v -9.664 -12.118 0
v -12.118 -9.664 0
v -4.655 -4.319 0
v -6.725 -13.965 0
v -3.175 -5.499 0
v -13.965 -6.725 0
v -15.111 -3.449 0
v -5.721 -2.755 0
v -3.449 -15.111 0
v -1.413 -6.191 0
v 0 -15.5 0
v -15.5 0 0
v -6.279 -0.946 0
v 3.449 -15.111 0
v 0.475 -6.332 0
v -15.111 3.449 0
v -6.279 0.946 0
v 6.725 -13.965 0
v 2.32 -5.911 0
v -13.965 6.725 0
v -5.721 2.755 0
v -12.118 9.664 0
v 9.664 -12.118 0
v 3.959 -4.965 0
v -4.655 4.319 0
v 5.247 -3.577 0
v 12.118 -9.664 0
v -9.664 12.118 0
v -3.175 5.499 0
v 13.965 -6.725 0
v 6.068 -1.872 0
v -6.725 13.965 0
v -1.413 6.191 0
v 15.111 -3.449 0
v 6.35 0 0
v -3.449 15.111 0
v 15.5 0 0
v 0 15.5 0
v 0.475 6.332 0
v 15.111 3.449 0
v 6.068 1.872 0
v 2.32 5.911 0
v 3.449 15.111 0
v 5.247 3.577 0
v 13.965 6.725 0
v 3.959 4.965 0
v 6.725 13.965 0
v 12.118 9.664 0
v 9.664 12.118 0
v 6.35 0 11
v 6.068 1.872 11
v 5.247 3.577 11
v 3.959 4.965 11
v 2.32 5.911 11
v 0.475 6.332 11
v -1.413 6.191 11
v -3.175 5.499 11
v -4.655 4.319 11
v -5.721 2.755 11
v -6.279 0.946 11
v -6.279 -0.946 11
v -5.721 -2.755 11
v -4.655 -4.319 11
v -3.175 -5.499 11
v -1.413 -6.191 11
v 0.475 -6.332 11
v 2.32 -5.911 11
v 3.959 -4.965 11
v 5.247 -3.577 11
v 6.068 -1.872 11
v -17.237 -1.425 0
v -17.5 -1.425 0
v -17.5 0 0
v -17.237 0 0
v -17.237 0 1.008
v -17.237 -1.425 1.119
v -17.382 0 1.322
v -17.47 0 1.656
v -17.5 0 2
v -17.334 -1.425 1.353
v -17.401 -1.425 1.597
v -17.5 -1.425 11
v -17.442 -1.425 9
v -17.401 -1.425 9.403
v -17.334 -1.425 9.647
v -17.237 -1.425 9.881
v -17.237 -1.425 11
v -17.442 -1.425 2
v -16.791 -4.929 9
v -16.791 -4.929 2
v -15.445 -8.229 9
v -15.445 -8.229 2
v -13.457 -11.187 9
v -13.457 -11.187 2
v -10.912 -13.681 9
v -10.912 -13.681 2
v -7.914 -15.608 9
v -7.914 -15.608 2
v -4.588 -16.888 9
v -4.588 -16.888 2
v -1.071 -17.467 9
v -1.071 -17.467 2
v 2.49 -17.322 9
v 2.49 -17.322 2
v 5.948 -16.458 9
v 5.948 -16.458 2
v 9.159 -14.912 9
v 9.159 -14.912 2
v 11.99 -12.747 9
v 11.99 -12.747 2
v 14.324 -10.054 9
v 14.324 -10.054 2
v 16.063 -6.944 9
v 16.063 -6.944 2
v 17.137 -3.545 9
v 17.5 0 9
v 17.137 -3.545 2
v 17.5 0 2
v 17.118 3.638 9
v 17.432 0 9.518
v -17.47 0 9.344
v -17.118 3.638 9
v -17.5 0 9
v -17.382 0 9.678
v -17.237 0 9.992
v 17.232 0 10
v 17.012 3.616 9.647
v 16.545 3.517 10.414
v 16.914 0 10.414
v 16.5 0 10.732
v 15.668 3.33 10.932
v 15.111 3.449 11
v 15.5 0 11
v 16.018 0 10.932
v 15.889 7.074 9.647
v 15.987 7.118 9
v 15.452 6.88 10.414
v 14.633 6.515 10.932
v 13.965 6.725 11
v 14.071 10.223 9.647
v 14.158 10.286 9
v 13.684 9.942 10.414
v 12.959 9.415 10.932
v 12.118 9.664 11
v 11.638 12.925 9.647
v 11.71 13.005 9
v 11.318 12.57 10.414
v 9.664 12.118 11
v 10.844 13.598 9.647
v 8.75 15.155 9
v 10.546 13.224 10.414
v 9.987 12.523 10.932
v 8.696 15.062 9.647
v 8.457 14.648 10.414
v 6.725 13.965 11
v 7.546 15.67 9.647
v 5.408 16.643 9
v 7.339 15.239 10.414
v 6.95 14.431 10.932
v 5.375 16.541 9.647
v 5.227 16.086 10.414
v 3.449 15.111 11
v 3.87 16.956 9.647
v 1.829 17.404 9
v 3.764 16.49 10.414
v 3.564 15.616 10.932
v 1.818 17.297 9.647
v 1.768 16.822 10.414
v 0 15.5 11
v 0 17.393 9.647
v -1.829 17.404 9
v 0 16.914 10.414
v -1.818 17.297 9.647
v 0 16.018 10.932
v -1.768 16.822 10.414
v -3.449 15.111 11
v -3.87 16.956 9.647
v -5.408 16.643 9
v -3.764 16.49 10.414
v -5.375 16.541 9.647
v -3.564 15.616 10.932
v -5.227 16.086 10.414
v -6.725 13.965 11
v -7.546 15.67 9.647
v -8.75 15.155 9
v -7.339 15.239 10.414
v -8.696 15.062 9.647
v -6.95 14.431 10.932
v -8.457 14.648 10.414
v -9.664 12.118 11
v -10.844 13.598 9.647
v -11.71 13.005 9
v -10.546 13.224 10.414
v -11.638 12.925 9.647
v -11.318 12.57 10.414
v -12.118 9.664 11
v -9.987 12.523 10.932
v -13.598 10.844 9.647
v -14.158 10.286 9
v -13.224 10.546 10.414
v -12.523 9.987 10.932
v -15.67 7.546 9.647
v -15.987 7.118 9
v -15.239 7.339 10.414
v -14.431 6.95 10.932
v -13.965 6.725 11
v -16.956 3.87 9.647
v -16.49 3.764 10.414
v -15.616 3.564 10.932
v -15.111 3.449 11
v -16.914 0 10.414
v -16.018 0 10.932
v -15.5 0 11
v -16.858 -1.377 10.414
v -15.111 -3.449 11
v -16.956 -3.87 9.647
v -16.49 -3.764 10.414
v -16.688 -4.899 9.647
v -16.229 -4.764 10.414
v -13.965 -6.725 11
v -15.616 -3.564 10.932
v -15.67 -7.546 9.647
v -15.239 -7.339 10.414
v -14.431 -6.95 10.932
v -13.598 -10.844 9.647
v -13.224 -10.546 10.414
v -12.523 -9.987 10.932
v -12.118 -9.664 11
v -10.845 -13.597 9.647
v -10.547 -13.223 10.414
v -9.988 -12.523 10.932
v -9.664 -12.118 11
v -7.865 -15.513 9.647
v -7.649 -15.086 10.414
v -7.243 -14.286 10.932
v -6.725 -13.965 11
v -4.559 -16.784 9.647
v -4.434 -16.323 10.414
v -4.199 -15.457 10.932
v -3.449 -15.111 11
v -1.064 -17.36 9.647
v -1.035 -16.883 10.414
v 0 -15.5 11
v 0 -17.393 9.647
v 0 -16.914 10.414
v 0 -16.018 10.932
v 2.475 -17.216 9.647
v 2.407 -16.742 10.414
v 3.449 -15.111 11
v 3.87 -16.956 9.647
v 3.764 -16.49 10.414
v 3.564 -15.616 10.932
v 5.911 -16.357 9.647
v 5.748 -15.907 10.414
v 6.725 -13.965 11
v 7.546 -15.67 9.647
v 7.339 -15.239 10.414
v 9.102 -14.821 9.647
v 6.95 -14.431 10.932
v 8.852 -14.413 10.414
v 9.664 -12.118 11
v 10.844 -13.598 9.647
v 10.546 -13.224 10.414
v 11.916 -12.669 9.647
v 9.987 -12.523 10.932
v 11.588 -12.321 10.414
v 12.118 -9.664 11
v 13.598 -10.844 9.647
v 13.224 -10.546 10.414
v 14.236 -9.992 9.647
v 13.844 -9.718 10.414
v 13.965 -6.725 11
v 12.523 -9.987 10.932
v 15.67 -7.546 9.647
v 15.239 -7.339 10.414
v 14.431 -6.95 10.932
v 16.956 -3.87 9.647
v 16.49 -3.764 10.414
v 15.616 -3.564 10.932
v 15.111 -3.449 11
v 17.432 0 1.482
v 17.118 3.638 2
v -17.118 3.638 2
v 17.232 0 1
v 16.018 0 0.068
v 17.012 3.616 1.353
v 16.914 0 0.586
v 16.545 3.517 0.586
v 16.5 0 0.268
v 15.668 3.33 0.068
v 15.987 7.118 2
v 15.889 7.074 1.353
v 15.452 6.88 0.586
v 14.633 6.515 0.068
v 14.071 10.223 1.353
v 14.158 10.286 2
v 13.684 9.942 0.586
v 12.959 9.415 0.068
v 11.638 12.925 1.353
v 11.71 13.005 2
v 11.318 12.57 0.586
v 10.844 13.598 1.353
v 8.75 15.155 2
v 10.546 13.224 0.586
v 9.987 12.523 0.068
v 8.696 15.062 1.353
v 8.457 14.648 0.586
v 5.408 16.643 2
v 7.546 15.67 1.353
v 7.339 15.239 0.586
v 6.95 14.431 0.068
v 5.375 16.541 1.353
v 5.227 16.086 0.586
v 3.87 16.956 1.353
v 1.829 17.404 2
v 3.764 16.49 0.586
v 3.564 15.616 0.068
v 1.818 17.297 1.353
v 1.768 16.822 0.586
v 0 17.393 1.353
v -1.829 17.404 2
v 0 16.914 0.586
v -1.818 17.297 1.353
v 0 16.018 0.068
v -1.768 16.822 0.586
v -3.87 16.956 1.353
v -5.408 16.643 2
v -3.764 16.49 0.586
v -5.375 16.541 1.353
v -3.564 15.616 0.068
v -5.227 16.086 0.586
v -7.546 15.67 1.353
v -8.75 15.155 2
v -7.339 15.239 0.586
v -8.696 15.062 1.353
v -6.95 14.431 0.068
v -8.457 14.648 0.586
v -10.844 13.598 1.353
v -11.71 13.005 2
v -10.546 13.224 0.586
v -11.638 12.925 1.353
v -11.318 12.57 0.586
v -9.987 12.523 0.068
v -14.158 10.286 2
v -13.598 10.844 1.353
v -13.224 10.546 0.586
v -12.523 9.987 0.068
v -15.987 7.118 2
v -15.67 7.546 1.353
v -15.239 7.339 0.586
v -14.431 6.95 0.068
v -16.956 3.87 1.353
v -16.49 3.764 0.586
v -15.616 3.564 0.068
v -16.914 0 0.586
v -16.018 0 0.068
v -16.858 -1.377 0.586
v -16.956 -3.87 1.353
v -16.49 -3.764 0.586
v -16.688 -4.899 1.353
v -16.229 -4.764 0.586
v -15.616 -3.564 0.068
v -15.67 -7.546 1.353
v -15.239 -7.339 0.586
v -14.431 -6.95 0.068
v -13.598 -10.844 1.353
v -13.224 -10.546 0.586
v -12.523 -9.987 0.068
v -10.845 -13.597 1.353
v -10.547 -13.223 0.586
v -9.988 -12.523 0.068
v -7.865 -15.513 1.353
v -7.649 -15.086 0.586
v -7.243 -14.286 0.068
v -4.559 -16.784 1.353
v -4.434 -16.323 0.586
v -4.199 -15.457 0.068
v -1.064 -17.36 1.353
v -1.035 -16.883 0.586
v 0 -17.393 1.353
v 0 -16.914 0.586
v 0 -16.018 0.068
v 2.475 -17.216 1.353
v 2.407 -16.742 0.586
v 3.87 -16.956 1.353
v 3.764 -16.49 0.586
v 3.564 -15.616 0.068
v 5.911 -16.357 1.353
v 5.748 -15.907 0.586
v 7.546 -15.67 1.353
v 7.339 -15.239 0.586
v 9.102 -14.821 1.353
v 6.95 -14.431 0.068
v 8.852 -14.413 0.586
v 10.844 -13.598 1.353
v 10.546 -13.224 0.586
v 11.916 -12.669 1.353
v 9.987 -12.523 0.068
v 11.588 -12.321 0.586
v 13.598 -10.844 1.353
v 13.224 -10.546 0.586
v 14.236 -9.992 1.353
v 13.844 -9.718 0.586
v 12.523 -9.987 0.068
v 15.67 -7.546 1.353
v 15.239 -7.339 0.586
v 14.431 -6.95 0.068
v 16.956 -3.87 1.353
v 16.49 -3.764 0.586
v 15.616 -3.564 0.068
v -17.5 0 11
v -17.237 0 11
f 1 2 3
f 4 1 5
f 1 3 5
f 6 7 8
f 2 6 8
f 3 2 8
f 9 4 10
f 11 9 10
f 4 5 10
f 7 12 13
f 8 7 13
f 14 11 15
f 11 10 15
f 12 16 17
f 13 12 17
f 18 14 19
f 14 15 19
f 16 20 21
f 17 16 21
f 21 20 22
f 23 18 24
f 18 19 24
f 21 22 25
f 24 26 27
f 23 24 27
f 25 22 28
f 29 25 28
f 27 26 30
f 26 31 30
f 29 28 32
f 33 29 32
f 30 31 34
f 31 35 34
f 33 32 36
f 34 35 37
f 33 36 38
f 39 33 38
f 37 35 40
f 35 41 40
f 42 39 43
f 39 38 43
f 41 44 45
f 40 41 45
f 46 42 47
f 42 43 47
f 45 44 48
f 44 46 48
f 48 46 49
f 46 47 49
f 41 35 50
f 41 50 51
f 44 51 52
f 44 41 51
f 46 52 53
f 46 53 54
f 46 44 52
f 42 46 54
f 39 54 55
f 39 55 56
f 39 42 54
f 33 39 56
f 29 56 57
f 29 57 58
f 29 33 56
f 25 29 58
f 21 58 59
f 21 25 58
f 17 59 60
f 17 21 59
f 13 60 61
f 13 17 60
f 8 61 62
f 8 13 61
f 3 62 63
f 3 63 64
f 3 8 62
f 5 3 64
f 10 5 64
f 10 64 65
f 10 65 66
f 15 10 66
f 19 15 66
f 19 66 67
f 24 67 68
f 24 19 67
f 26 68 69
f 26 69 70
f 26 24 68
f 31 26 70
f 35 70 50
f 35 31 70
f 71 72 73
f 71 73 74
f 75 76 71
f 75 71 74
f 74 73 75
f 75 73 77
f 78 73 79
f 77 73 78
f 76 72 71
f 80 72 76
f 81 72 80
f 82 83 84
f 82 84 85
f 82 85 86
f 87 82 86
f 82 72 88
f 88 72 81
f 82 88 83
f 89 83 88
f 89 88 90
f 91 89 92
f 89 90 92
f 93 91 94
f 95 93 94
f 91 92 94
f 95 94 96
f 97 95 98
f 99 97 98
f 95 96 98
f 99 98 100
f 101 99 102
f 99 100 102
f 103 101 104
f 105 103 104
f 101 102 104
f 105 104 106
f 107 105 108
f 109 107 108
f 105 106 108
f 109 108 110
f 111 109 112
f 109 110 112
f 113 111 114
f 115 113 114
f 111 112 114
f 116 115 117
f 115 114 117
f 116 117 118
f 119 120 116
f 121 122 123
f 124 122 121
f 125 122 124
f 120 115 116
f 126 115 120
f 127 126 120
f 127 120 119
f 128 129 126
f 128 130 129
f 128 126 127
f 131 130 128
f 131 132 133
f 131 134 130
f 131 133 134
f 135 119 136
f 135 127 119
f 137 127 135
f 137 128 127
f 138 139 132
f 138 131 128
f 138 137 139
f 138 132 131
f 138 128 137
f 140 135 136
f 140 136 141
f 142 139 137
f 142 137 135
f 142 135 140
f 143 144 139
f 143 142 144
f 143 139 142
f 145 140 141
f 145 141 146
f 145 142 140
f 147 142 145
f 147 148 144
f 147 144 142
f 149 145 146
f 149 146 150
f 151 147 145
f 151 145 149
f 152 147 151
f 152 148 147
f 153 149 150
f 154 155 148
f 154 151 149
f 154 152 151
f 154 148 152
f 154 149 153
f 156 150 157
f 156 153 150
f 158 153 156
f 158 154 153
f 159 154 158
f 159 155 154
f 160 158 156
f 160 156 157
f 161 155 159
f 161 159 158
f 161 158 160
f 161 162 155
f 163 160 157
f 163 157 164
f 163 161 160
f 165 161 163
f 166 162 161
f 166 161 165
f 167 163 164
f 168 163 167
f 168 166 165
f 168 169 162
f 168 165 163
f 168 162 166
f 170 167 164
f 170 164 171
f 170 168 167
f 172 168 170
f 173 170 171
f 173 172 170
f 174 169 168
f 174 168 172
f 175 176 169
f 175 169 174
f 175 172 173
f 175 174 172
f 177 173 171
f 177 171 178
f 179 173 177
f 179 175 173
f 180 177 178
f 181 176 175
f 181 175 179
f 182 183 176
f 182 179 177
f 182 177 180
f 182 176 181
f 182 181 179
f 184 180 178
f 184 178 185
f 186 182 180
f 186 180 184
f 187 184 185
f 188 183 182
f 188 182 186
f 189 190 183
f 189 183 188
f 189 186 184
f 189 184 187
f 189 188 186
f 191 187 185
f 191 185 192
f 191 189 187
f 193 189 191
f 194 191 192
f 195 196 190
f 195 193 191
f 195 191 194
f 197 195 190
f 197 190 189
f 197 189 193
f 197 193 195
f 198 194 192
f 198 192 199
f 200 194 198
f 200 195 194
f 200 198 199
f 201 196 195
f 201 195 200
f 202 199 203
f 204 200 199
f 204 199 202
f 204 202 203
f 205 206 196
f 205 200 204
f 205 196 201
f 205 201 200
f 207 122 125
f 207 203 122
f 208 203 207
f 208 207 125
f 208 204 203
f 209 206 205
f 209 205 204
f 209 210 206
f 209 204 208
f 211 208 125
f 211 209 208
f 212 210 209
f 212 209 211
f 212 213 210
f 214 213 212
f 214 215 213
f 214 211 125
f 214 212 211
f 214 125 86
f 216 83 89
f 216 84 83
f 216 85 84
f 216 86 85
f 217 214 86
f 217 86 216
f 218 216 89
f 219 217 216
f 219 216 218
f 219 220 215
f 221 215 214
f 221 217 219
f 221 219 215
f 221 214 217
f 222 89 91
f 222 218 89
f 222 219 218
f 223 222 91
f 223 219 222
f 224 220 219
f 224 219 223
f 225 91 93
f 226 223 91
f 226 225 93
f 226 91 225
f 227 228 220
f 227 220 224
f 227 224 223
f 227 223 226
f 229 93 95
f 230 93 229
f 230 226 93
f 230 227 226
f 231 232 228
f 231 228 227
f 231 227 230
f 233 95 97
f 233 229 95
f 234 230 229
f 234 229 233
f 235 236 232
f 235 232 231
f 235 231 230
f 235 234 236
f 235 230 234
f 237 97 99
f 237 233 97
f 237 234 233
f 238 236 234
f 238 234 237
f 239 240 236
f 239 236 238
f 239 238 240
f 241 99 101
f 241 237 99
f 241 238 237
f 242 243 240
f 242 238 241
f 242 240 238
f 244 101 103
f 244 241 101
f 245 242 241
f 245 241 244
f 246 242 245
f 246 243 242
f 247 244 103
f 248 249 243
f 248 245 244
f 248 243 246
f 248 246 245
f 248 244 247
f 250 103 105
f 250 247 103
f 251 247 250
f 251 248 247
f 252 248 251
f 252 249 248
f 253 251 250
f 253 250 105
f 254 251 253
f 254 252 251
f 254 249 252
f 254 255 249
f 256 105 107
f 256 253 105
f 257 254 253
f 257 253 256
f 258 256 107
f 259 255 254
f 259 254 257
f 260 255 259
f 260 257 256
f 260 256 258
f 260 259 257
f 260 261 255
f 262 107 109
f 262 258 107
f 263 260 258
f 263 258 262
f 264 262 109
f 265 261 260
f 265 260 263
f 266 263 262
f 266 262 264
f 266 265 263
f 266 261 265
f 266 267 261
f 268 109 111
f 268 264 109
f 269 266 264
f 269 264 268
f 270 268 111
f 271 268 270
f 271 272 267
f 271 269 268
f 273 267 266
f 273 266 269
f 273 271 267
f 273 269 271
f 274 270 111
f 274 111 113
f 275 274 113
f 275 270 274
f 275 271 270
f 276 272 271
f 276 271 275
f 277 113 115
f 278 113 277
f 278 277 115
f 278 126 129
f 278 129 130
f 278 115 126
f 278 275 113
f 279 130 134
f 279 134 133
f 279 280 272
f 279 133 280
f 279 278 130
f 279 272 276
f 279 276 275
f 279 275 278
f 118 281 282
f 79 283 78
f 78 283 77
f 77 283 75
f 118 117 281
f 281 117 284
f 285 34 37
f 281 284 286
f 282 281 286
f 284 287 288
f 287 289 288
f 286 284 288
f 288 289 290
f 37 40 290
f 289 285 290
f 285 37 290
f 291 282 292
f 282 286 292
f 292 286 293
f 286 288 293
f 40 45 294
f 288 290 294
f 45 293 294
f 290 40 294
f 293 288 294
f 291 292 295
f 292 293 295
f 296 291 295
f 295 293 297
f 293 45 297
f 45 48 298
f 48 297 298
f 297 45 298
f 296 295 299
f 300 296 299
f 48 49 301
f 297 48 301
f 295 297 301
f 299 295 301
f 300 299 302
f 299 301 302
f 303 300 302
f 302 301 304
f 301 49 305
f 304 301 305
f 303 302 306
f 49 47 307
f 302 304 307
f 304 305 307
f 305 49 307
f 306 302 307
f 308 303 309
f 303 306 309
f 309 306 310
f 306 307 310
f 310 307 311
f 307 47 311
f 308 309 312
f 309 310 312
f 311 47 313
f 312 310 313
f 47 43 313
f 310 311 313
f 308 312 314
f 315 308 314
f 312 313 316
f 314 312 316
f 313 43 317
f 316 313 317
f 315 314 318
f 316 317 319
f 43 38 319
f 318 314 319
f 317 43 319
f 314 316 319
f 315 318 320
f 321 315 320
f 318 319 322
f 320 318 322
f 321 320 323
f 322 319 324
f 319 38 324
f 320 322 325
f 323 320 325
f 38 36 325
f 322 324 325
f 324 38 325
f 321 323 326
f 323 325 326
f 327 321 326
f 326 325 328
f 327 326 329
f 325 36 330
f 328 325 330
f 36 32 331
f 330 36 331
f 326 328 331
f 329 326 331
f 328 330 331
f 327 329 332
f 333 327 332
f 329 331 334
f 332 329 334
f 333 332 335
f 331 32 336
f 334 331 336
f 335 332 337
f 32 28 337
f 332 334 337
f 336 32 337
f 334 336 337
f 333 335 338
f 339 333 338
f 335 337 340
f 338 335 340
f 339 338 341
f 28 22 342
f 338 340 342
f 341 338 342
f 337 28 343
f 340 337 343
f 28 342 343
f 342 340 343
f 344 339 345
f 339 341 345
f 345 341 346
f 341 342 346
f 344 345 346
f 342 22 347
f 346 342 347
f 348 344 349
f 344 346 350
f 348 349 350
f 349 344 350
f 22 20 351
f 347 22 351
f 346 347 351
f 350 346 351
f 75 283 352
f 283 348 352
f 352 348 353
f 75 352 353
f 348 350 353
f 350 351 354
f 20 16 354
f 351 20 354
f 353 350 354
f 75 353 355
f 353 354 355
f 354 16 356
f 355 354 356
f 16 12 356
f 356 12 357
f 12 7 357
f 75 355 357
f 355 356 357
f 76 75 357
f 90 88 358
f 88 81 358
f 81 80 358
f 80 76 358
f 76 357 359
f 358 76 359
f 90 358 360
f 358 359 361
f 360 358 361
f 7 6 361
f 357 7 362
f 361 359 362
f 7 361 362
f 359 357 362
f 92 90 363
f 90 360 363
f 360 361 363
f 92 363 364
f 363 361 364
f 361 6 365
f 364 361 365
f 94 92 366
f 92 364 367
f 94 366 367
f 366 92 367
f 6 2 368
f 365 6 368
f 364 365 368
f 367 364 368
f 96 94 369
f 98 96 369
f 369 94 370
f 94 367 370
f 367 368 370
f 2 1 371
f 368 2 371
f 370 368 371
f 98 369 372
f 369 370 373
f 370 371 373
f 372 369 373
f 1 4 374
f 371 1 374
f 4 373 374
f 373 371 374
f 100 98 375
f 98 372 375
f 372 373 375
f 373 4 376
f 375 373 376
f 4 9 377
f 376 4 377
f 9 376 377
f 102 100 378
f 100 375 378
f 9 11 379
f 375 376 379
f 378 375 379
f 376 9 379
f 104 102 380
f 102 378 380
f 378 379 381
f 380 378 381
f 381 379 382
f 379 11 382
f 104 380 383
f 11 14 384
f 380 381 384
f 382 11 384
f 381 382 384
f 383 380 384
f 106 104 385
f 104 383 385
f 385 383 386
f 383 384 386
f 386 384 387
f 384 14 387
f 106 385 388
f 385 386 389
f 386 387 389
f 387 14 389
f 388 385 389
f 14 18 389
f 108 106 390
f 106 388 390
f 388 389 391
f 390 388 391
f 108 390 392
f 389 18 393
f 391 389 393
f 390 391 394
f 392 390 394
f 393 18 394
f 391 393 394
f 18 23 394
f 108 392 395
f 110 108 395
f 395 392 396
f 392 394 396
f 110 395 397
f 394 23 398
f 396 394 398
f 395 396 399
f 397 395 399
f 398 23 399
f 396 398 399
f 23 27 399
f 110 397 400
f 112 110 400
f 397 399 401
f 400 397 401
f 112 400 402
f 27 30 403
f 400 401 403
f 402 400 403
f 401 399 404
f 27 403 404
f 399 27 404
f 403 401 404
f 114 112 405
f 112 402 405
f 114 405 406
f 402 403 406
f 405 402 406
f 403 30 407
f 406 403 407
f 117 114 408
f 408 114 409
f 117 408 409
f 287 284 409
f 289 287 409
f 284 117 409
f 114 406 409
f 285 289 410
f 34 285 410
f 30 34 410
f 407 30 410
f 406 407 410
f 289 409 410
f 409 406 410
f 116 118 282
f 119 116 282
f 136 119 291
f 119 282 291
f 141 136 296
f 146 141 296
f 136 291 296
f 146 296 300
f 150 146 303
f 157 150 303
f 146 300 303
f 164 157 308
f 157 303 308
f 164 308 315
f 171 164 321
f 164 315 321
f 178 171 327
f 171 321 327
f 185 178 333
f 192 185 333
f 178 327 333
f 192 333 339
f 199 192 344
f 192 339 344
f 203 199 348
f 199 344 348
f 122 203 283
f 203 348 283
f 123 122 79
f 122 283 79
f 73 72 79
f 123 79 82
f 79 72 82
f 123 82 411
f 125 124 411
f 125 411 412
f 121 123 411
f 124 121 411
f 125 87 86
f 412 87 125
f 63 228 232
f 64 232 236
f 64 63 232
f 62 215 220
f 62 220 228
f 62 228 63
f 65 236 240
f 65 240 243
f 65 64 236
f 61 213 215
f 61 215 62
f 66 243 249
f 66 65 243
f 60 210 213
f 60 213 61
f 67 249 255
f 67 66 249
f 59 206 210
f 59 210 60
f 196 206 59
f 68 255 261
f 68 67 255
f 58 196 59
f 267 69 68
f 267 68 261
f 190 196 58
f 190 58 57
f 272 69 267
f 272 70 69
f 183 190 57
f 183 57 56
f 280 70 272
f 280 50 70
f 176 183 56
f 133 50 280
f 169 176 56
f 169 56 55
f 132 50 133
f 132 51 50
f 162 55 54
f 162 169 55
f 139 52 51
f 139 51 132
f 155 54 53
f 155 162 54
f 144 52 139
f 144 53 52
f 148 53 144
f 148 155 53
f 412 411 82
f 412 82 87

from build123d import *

# Parameters (mm, degrees)
CROQUIS1_R              = 17.5
CROQUIS1_R_2            = 6.35
SALIENTE_EXTRUIR1_DEPTH = 11
REDONDEO1_R             = 2
SALIENTE_EXTRUIR2_REACH = 29.083
CROQUIS2_W              = 0.263095083
CROQUIS2_H              = 1.425025485


with BuildPart() as part:
    # Croquis1 → Saliente-Extruir1 (new body)
    with BuildSketch(Plane.XY):
        Circle(CROQUIS1_R)
        Circle(CROQUIS1_R_2, mode=Mode.SUBTRACT)
    extrude(amount=SALIENTE_EXTRUIR1_DEPTH)

    # Redondeo1
    redondeo1_edges = [part.edges().sort_by_distance(p)[0] for p in [
        (-17.5, 0, 0),
        (-17.5, 0, 11),
    ]]
    fillet(redondeo1_edges, radius=REDONDEO1_R)

    # Saliente-Extruir2: up to this face of the body (flat: up to its plane)
    saliente_extruir2_end = Plane(part.part.faces().sort_by_distance((-15.061593796, 0, 0))[0])
    # Croquis2 → Saliente-Extruir2 (add, up to the picked face)
    with BuildSketch(Plane.XY.offset(11), mode=Mode.PRIVATE) as saliente_extruir2_sk1:
        with Locations((-17.368452459, -0.712512743)):
            Rectangle(CROQUIS2_W, CROQUIS2_H)
    saliente_extruir2_tool1 = split(extrude(saliente_extruir2_sk1.sketch, amount=-SALIENTE_EXTRUIR2_REACH, mode=Mode.PRIVATE), bisect_by=saliente_extruir2_end, keep=Keep.BOTH, mode=Mode.PRIVATE)
    add(saliente_extruir2_tool1.solids().sort_by(Axis((-17.368452, -0.712513, 11), (0, 0, -1)))[0])


solid = part.part
